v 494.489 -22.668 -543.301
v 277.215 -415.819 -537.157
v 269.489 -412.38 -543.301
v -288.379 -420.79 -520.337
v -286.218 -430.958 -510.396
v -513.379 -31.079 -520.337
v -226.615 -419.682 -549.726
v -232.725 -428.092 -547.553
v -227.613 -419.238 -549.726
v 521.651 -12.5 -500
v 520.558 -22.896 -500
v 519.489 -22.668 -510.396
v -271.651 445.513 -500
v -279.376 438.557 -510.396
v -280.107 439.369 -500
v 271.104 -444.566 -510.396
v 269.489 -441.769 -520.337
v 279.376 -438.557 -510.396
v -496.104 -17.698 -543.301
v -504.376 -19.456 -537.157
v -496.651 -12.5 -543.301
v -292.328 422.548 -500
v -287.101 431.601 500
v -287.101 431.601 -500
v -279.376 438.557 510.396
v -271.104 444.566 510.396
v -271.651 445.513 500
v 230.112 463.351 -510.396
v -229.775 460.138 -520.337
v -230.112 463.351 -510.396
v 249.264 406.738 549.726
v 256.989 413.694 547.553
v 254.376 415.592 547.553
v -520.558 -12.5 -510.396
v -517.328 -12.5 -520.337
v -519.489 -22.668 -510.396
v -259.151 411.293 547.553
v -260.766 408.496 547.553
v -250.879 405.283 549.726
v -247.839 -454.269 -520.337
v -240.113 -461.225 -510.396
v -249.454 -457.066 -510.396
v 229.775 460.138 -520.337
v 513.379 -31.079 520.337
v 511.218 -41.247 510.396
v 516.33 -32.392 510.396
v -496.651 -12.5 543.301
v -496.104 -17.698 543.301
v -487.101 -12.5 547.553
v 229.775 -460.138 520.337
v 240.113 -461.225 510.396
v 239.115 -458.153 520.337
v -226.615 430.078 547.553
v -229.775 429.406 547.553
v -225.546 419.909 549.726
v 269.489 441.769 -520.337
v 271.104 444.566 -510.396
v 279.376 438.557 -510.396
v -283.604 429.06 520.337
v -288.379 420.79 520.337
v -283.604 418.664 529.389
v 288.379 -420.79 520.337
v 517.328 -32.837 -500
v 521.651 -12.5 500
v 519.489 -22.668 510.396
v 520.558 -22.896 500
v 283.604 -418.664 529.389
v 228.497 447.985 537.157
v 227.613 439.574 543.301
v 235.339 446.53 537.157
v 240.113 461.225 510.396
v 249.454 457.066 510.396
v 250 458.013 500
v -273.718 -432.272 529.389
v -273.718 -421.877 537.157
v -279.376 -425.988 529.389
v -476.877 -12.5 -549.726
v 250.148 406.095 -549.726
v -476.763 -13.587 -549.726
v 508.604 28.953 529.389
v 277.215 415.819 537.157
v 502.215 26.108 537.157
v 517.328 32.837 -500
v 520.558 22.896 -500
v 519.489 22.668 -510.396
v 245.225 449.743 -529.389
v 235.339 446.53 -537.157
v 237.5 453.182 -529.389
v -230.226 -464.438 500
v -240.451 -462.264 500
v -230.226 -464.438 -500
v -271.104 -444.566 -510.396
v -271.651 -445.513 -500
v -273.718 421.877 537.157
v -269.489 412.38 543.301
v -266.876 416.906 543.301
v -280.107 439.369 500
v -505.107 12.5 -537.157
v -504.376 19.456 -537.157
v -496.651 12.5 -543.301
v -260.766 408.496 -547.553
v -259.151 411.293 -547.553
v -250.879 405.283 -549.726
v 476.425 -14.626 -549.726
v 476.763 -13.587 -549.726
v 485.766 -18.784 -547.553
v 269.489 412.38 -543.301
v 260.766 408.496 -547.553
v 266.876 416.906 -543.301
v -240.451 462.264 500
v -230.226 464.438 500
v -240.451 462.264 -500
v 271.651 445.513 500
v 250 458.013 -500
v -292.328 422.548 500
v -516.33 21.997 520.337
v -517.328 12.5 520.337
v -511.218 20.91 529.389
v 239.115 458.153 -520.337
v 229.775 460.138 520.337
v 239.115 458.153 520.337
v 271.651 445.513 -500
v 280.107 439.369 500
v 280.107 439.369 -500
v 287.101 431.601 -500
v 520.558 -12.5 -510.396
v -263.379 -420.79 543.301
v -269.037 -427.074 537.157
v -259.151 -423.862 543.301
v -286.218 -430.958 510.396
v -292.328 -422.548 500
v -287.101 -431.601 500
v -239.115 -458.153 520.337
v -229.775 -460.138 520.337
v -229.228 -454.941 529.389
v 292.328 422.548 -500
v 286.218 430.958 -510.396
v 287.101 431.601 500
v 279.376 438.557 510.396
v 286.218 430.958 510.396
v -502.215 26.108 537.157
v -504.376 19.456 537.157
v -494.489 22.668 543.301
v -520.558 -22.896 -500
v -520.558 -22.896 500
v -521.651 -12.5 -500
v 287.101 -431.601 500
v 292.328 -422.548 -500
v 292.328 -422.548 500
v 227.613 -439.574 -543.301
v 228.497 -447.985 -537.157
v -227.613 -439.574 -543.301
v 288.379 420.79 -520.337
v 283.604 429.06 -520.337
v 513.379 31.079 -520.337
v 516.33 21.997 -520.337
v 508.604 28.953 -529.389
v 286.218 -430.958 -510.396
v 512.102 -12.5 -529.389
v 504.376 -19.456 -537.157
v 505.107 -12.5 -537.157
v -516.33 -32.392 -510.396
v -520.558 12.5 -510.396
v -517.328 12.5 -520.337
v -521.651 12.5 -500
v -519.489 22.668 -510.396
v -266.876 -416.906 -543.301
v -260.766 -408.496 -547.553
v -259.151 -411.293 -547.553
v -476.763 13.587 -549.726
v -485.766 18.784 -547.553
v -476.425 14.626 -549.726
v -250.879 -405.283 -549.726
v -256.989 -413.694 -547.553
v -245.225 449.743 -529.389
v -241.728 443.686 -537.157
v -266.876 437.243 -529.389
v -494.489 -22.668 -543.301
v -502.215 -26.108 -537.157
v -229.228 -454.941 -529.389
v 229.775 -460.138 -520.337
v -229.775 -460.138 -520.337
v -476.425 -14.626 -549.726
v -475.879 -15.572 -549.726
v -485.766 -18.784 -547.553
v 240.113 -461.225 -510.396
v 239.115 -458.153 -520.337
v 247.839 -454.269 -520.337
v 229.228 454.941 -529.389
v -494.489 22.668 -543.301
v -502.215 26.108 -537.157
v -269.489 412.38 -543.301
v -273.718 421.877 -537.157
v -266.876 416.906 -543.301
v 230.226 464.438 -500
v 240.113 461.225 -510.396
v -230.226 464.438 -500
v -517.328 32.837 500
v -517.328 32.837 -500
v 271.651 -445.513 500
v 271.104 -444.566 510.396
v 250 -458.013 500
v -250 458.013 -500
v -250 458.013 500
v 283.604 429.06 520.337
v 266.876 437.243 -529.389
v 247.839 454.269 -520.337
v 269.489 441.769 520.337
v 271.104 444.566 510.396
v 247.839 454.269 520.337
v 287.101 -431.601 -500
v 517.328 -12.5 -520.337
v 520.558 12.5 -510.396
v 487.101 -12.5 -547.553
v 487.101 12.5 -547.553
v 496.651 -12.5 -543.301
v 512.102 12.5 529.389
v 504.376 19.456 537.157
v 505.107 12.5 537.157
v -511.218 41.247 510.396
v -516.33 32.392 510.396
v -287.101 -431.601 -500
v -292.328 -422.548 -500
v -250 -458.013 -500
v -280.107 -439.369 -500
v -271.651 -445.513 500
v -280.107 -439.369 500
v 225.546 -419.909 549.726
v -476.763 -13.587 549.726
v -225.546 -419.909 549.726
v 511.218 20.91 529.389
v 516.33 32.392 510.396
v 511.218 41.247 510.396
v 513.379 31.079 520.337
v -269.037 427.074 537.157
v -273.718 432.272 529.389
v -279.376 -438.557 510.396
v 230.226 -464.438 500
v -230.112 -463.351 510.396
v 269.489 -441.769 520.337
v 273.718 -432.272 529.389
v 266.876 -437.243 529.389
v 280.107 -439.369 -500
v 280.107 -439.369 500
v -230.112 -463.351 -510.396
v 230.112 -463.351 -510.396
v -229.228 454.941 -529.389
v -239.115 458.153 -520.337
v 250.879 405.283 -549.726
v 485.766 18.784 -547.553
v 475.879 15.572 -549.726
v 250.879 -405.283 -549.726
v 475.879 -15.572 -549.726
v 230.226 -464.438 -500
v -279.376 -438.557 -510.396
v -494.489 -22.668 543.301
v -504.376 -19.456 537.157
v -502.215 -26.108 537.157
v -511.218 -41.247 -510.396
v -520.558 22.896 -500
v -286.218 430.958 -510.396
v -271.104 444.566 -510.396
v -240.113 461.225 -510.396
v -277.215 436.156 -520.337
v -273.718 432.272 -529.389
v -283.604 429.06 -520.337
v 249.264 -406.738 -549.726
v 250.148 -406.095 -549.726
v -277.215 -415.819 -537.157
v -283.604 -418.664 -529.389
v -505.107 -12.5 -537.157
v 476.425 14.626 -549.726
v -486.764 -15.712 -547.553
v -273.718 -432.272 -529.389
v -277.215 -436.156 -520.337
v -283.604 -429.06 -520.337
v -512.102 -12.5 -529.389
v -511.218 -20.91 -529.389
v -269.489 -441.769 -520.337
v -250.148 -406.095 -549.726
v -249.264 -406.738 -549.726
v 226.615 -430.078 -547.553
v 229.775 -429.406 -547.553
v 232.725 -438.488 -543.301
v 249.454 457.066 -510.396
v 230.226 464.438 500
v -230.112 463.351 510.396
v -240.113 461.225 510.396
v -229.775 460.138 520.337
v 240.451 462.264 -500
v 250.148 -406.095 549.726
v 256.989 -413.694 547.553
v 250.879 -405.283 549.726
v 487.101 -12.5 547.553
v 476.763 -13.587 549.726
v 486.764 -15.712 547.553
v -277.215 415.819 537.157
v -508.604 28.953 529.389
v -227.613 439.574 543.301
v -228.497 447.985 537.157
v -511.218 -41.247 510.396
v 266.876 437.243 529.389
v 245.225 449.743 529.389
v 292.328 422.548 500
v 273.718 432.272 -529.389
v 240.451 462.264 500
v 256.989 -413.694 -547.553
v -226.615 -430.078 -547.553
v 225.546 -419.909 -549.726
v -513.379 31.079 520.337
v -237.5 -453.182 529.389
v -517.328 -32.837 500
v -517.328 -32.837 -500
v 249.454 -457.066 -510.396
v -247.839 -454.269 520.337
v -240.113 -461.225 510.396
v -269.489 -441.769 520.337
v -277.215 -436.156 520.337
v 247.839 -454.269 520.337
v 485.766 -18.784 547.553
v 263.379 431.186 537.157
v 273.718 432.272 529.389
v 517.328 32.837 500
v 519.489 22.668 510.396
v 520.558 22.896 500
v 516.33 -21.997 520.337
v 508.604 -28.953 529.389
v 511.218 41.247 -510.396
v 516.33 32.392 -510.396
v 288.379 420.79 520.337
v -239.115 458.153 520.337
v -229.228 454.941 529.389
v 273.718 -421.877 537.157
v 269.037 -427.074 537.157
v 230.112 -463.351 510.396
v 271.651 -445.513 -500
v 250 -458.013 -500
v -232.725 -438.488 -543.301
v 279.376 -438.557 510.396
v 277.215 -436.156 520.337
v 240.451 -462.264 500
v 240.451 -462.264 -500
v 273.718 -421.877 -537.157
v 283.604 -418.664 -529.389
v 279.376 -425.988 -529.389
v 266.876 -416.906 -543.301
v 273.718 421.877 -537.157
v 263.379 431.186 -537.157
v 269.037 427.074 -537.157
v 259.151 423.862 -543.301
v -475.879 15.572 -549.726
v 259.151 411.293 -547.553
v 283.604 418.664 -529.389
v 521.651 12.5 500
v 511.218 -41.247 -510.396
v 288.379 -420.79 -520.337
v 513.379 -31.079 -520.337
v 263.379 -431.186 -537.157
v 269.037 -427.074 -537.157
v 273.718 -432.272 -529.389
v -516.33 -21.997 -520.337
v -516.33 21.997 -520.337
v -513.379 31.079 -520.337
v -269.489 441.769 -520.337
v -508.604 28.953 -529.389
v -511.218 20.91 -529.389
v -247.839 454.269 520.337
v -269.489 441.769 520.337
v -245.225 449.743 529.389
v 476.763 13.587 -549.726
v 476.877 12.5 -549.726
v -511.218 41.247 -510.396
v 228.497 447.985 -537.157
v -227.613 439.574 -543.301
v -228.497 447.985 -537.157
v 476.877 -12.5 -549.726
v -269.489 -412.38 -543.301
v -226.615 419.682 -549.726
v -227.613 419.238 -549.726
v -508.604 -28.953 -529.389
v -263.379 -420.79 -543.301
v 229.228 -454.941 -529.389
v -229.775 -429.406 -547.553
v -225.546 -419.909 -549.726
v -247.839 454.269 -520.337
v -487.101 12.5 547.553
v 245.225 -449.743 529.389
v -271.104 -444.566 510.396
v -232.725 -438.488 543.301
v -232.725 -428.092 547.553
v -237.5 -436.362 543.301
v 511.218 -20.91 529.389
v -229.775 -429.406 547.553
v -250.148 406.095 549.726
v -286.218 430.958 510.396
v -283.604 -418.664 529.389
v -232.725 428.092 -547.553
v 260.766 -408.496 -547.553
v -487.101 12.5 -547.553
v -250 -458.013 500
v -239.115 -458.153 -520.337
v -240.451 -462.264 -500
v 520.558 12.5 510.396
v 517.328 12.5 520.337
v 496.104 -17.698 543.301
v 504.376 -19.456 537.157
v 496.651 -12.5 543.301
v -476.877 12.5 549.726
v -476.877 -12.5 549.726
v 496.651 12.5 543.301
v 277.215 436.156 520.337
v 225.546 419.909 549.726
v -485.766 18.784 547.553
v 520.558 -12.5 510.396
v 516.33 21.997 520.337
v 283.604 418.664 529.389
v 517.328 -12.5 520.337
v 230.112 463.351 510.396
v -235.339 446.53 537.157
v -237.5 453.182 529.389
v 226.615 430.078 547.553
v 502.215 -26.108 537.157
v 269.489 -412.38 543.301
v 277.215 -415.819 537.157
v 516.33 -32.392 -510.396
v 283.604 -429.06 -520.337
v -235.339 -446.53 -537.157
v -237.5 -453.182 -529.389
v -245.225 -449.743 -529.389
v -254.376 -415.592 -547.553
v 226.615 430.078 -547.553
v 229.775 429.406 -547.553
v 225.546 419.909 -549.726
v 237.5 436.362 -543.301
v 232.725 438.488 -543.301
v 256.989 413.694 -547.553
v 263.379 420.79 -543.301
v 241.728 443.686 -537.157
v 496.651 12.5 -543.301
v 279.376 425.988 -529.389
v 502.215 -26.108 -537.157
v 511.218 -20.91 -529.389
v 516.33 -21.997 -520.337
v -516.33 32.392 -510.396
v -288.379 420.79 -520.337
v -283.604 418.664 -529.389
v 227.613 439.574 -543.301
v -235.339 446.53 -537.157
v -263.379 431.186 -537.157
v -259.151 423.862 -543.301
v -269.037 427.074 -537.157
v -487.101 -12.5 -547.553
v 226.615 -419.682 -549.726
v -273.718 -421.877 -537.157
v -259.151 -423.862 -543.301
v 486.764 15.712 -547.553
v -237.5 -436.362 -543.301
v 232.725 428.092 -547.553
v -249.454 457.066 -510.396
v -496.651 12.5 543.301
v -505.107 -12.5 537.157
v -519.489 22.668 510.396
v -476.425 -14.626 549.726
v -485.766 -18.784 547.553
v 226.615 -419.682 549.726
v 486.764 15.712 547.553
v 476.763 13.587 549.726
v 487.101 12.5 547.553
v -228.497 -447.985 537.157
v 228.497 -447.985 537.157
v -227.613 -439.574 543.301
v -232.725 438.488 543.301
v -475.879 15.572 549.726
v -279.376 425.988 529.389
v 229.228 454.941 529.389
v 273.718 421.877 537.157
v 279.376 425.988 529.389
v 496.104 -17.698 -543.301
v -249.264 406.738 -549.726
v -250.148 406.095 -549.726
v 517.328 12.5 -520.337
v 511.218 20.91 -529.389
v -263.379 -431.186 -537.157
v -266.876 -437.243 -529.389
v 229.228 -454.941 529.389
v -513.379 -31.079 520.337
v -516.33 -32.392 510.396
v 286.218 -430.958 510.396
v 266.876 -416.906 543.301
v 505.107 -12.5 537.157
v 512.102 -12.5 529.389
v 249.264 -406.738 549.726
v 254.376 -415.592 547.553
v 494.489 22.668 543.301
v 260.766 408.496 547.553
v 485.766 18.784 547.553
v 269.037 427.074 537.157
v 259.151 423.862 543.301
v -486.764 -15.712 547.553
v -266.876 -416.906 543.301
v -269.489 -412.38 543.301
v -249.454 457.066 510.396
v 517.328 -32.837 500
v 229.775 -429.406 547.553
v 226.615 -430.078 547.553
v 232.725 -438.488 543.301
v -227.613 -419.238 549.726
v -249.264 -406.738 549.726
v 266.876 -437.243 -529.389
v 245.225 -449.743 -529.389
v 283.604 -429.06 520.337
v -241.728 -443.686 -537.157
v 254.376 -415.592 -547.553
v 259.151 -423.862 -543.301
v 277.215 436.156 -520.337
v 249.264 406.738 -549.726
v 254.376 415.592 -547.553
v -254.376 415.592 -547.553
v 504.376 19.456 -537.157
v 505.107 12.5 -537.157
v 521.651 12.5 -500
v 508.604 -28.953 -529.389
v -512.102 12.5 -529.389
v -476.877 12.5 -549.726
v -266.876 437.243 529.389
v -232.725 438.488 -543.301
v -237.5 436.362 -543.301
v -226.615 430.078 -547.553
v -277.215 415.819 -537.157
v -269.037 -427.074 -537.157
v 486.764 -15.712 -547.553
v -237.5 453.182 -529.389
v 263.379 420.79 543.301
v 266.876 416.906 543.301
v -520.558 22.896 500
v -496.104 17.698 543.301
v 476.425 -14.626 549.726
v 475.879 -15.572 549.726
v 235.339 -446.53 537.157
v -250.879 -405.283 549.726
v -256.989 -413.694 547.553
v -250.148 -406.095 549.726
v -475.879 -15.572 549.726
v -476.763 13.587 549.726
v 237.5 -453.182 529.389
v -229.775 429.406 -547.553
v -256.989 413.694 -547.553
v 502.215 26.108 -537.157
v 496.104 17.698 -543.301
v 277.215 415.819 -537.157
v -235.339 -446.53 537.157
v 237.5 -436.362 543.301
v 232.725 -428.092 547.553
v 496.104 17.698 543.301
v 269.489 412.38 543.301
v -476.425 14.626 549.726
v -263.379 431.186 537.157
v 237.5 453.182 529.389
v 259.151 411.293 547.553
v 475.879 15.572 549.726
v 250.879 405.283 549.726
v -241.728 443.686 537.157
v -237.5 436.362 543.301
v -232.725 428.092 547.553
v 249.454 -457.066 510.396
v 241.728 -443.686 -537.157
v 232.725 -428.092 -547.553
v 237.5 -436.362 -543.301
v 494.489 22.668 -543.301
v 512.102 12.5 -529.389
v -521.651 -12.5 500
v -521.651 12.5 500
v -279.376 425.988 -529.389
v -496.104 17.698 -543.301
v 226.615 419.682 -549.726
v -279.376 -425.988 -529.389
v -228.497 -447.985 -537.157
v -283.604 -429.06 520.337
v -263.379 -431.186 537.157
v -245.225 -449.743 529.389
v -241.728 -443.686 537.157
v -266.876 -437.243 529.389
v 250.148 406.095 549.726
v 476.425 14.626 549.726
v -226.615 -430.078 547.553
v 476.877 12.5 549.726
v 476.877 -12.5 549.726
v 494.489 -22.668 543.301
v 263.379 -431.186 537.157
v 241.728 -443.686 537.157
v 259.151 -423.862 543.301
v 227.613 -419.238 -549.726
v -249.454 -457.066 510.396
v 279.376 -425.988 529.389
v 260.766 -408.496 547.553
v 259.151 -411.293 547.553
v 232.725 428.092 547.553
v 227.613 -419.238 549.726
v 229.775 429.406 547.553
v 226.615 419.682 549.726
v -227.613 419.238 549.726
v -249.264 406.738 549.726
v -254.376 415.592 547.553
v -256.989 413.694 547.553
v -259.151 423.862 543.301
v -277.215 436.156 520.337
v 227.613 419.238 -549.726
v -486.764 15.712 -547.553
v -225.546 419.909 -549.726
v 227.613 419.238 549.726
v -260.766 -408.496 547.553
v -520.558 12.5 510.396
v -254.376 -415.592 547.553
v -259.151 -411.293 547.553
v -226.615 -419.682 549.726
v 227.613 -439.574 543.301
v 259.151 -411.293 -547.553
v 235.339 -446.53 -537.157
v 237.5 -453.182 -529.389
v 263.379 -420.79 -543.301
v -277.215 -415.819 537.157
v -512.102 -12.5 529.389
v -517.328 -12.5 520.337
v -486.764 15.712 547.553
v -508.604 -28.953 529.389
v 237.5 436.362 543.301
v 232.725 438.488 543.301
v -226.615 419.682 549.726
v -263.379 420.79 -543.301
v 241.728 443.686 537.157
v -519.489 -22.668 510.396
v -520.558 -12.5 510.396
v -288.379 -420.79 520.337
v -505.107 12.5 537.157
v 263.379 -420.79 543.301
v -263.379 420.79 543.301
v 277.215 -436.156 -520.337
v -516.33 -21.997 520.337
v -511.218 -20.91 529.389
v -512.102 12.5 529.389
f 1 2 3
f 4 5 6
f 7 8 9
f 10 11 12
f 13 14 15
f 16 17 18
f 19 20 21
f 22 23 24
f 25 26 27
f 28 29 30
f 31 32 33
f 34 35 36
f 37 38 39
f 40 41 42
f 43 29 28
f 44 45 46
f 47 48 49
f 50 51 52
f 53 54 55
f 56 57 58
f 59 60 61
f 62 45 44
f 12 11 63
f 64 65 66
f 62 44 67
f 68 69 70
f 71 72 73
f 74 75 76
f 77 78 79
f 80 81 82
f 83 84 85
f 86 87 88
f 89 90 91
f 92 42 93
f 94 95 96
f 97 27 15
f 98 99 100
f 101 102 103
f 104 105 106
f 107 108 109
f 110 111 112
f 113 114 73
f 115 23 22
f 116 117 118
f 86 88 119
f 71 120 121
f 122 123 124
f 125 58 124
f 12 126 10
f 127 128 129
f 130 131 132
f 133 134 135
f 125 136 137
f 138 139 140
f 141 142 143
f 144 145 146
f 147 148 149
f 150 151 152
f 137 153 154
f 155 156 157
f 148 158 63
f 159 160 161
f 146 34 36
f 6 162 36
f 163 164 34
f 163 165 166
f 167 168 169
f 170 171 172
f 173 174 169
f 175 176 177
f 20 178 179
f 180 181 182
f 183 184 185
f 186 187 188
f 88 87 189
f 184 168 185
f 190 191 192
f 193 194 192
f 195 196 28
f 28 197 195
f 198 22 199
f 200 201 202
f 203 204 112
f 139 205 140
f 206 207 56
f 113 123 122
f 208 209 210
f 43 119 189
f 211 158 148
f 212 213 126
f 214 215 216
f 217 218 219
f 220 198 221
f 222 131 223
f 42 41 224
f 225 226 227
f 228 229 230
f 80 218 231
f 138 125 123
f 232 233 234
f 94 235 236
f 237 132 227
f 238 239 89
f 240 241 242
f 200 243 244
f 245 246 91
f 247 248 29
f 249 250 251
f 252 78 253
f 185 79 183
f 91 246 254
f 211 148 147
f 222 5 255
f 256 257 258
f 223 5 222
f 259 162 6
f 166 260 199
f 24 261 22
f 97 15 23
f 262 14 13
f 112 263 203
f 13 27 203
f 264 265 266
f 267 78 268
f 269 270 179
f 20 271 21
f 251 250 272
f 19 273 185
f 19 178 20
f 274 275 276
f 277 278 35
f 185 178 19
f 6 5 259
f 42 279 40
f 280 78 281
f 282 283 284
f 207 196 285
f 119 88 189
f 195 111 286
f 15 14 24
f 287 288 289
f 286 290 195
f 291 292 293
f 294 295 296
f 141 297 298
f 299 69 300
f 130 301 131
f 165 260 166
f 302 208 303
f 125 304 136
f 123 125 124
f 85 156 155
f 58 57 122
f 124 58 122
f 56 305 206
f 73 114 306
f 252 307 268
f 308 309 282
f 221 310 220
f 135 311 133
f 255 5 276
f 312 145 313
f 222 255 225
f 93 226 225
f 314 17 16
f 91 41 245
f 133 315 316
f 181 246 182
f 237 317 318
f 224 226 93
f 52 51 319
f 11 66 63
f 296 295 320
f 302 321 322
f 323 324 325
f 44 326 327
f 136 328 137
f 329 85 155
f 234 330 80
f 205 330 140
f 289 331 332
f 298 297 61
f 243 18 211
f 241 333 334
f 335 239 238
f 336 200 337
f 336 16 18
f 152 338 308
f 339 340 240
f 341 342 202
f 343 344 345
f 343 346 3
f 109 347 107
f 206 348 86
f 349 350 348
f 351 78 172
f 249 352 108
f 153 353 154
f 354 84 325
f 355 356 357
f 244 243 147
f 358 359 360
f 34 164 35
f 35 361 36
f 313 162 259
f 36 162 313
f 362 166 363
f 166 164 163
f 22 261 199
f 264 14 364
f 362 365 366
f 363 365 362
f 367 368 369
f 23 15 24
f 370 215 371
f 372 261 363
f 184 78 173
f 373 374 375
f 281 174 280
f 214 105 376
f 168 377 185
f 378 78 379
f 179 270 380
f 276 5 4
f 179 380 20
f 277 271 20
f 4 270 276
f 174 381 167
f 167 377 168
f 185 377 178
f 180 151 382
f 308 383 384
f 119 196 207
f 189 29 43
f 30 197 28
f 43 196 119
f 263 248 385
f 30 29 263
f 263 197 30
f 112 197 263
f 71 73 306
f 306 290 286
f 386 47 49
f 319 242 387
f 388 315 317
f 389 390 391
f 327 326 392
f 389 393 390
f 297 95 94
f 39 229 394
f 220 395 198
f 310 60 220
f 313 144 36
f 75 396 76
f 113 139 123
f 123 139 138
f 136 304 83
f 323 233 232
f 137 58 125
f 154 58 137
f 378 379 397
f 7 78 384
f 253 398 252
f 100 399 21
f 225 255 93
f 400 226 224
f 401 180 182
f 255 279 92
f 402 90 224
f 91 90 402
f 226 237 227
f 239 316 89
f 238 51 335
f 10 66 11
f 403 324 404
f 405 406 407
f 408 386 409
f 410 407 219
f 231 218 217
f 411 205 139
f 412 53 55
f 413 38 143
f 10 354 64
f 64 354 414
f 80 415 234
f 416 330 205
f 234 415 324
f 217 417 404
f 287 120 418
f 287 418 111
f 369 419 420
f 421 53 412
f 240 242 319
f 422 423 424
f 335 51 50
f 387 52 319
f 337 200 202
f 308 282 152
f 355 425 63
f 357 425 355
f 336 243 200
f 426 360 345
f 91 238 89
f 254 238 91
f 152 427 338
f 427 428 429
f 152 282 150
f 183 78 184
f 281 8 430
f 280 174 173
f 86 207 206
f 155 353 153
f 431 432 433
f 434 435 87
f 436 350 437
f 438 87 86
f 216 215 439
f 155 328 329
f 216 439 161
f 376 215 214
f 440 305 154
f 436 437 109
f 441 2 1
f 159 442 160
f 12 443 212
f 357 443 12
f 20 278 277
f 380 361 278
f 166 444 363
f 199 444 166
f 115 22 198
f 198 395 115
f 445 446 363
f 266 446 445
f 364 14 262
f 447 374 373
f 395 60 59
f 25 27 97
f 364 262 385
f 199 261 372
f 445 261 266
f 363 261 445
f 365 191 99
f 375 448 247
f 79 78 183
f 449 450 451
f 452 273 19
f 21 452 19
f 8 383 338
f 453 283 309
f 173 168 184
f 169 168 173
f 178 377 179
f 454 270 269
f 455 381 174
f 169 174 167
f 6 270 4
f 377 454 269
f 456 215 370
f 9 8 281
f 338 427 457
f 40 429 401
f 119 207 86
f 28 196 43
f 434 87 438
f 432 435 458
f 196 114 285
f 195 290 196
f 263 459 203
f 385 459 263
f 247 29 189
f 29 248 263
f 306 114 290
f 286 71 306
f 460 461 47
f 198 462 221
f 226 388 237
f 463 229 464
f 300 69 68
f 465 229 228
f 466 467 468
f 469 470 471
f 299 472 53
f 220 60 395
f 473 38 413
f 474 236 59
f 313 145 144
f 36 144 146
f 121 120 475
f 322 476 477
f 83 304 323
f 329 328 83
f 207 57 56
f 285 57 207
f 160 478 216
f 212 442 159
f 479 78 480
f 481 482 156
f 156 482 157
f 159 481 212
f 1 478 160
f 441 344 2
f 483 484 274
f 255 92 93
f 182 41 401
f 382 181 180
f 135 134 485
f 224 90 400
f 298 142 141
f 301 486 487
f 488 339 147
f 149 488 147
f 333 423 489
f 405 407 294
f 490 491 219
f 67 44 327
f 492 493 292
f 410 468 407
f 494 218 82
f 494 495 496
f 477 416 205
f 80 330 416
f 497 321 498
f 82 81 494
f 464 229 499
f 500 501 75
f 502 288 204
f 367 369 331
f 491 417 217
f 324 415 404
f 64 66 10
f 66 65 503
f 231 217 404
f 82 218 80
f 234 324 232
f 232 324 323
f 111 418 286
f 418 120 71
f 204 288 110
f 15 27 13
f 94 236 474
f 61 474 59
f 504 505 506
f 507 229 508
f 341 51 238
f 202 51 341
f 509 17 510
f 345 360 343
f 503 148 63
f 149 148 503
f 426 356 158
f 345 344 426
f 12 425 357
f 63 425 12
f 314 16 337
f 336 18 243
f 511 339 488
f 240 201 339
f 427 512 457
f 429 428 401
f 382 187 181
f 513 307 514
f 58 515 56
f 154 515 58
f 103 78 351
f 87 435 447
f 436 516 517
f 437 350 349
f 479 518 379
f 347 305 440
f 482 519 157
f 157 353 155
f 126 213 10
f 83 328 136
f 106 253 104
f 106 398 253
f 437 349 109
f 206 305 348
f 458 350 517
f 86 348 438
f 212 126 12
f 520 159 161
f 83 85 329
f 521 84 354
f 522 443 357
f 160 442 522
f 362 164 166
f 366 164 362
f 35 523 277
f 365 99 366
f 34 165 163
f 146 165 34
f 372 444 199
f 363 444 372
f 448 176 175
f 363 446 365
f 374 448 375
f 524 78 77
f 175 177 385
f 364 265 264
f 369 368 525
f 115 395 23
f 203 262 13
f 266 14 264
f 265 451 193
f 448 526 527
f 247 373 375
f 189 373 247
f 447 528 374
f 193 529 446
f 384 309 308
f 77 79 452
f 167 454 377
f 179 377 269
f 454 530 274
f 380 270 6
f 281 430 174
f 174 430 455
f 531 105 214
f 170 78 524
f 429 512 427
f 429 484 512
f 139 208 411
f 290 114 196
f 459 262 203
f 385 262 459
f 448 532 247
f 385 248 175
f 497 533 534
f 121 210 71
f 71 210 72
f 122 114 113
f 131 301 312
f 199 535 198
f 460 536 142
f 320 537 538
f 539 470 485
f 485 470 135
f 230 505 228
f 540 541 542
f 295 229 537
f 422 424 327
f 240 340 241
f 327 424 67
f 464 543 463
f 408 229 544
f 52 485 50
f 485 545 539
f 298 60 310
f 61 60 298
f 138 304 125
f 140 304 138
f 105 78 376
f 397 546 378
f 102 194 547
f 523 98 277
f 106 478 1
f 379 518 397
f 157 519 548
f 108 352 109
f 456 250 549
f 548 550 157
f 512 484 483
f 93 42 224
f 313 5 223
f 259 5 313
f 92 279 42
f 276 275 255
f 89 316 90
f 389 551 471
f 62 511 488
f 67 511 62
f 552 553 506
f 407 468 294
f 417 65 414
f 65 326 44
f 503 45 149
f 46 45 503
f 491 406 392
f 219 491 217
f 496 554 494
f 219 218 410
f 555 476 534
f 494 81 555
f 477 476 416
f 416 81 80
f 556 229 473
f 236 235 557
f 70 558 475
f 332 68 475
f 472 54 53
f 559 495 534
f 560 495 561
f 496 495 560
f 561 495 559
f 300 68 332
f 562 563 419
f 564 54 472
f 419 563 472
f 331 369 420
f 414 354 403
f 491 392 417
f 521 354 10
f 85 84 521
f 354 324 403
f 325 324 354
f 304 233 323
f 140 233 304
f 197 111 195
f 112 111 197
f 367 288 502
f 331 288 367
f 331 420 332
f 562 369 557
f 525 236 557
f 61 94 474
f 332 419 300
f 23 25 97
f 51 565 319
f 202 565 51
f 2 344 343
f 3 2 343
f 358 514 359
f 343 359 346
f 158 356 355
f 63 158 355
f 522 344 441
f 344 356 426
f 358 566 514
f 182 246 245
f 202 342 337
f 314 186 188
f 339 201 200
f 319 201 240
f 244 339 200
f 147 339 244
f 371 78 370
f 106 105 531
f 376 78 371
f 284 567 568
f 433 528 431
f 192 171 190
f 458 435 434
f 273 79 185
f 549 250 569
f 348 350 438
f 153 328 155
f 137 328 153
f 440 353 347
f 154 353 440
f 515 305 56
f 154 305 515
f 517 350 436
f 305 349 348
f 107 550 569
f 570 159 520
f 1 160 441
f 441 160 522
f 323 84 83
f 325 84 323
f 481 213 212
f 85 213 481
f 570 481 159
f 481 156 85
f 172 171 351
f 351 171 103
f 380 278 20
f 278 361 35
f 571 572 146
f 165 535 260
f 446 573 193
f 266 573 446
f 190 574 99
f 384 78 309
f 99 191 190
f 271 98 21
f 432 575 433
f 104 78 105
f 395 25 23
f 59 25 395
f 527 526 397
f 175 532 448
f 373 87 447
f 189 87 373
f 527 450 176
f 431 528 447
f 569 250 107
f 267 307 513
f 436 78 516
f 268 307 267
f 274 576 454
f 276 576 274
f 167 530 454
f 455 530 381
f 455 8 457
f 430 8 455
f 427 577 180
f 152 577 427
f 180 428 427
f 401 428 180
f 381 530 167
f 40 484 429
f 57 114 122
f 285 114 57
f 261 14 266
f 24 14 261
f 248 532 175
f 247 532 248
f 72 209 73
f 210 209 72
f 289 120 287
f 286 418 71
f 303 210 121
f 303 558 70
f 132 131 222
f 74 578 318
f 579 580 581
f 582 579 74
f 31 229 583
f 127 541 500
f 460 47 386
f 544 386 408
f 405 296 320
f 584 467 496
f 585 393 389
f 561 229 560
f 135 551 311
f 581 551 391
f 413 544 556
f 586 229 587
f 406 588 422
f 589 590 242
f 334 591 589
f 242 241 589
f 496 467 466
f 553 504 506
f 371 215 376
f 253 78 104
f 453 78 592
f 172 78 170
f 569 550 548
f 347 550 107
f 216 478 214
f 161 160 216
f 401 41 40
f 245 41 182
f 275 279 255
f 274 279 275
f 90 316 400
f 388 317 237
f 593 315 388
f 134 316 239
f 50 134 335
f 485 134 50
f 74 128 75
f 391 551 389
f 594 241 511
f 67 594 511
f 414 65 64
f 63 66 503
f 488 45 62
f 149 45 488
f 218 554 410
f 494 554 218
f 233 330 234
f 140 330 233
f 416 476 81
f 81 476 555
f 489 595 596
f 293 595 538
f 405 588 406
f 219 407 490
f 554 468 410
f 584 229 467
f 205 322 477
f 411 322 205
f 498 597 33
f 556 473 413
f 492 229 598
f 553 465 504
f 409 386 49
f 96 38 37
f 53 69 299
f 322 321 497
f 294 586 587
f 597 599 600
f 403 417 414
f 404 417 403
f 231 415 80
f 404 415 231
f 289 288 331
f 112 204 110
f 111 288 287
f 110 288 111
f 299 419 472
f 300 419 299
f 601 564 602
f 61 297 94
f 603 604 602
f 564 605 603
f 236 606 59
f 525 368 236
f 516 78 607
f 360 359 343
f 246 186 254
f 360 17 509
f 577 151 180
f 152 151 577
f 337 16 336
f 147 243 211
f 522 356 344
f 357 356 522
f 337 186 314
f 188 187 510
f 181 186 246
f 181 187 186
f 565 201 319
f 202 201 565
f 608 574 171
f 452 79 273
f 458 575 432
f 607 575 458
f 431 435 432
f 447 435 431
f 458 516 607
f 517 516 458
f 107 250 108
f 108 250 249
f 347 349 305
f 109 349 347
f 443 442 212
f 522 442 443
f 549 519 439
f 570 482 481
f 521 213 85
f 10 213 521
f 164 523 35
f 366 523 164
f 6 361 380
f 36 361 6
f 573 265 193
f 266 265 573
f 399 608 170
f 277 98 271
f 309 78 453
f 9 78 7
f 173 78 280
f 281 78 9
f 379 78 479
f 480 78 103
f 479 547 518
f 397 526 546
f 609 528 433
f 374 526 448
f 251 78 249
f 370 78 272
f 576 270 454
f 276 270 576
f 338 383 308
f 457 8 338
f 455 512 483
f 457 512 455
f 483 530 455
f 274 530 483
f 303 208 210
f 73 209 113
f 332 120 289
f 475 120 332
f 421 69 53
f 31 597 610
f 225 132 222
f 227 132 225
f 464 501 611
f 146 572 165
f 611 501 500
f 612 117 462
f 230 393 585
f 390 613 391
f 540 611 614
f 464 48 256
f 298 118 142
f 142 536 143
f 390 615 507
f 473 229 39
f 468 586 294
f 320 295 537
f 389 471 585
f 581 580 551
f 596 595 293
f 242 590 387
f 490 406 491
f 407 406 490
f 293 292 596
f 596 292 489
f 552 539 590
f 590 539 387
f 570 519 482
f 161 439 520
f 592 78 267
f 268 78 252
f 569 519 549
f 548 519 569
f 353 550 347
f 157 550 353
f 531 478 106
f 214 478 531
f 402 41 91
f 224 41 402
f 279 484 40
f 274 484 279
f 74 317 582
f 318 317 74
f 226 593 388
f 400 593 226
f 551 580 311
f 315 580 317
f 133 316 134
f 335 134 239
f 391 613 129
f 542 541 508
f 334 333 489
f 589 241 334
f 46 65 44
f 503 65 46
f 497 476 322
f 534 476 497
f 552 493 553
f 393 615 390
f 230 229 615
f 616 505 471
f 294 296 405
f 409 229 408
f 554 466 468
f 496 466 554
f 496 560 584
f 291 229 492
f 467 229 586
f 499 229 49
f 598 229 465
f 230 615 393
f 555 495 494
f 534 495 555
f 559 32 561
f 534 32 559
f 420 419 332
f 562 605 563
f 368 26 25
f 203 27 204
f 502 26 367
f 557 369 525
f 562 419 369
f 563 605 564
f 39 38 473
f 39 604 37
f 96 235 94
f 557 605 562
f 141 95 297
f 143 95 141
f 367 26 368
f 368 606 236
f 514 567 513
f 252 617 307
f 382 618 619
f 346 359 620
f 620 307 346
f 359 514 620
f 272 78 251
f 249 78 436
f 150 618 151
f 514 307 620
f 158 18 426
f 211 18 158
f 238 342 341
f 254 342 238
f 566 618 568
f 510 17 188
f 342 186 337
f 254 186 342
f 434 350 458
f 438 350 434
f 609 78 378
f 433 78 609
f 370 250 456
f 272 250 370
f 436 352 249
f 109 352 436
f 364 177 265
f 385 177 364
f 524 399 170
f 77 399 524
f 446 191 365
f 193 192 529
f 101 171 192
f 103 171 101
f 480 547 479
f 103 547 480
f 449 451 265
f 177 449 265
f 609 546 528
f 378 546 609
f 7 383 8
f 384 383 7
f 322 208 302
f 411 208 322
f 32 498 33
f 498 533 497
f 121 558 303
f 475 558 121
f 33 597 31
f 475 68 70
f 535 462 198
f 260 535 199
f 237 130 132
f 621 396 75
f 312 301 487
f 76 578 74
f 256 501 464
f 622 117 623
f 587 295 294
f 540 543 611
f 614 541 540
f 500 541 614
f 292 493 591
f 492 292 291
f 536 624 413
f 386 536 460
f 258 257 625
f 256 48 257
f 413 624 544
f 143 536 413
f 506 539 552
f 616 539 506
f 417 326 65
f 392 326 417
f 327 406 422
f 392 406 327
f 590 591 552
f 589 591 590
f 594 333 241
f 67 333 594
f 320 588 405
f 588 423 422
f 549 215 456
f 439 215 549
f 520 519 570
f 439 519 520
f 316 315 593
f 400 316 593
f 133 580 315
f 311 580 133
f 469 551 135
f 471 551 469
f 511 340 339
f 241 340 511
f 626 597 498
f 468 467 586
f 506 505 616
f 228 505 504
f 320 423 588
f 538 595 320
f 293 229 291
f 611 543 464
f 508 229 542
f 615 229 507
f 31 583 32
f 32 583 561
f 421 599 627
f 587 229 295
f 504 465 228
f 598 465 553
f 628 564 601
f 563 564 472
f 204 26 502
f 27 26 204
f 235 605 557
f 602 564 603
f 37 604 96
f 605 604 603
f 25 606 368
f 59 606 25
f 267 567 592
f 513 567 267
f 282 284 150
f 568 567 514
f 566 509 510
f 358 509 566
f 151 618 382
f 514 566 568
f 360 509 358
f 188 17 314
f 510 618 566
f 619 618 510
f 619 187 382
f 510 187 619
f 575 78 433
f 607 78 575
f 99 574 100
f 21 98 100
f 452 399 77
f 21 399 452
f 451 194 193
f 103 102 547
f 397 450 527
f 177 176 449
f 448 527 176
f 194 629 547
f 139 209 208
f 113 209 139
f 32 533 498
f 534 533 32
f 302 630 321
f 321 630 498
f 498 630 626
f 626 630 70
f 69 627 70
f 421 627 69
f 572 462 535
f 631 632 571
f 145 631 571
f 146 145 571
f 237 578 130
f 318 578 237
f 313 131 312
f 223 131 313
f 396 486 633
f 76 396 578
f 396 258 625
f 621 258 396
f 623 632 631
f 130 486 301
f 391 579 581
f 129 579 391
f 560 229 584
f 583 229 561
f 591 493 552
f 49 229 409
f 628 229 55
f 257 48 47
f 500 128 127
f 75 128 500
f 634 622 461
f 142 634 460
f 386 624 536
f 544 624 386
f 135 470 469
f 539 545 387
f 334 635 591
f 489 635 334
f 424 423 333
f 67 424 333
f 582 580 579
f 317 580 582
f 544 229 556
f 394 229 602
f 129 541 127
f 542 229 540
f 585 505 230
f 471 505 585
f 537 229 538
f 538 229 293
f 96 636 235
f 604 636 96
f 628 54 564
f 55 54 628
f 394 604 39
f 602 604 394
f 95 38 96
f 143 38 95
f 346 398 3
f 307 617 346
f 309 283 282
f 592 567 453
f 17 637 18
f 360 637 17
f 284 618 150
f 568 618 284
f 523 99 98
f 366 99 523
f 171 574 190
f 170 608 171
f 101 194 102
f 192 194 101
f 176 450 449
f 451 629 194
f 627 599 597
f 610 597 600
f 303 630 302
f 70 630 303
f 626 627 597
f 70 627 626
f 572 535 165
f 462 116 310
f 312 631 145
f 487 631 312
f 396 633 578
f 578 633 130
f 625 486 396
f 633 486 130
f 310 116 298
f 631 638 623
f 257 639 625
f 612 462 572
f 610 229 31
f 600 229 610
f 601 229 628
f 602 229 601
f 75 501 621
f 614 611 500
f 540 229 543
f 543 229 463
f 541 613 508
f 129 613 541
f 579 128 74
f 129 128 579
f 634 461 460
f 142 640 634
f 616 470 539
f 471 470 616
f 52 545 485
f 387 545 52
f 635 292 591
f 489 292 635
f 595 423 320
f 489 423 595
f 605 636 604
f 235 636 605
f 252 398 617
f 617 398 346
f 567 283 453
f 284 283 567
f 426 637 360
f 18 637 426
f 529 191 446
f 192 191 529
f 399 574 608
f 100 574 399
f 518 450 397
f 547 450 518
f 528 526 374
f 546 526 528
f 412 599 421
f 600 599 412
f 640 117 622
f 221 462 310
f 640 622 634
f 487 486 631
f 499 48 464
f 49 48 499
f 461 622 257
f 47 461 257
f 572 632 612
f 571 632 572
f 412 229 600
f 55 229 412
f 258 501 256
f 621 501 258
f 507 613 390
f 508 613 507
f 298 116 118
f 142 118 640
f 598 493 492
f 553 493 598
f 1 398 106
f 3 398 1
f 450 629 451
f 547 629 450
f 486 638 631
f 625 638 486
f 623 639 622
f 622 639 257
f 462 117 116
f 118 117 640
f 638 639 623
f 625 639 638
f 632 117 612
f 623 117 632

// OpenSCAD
minkowski() {
    cylinder(r=450,h=950,$fn=6,center =true);
    minkowski() {
        sphere(r=50,center=true);
        rotate ([0,0,30])
       cylinder(r=25,h=50,$fn=6, center=true); 
    
    }
    }
